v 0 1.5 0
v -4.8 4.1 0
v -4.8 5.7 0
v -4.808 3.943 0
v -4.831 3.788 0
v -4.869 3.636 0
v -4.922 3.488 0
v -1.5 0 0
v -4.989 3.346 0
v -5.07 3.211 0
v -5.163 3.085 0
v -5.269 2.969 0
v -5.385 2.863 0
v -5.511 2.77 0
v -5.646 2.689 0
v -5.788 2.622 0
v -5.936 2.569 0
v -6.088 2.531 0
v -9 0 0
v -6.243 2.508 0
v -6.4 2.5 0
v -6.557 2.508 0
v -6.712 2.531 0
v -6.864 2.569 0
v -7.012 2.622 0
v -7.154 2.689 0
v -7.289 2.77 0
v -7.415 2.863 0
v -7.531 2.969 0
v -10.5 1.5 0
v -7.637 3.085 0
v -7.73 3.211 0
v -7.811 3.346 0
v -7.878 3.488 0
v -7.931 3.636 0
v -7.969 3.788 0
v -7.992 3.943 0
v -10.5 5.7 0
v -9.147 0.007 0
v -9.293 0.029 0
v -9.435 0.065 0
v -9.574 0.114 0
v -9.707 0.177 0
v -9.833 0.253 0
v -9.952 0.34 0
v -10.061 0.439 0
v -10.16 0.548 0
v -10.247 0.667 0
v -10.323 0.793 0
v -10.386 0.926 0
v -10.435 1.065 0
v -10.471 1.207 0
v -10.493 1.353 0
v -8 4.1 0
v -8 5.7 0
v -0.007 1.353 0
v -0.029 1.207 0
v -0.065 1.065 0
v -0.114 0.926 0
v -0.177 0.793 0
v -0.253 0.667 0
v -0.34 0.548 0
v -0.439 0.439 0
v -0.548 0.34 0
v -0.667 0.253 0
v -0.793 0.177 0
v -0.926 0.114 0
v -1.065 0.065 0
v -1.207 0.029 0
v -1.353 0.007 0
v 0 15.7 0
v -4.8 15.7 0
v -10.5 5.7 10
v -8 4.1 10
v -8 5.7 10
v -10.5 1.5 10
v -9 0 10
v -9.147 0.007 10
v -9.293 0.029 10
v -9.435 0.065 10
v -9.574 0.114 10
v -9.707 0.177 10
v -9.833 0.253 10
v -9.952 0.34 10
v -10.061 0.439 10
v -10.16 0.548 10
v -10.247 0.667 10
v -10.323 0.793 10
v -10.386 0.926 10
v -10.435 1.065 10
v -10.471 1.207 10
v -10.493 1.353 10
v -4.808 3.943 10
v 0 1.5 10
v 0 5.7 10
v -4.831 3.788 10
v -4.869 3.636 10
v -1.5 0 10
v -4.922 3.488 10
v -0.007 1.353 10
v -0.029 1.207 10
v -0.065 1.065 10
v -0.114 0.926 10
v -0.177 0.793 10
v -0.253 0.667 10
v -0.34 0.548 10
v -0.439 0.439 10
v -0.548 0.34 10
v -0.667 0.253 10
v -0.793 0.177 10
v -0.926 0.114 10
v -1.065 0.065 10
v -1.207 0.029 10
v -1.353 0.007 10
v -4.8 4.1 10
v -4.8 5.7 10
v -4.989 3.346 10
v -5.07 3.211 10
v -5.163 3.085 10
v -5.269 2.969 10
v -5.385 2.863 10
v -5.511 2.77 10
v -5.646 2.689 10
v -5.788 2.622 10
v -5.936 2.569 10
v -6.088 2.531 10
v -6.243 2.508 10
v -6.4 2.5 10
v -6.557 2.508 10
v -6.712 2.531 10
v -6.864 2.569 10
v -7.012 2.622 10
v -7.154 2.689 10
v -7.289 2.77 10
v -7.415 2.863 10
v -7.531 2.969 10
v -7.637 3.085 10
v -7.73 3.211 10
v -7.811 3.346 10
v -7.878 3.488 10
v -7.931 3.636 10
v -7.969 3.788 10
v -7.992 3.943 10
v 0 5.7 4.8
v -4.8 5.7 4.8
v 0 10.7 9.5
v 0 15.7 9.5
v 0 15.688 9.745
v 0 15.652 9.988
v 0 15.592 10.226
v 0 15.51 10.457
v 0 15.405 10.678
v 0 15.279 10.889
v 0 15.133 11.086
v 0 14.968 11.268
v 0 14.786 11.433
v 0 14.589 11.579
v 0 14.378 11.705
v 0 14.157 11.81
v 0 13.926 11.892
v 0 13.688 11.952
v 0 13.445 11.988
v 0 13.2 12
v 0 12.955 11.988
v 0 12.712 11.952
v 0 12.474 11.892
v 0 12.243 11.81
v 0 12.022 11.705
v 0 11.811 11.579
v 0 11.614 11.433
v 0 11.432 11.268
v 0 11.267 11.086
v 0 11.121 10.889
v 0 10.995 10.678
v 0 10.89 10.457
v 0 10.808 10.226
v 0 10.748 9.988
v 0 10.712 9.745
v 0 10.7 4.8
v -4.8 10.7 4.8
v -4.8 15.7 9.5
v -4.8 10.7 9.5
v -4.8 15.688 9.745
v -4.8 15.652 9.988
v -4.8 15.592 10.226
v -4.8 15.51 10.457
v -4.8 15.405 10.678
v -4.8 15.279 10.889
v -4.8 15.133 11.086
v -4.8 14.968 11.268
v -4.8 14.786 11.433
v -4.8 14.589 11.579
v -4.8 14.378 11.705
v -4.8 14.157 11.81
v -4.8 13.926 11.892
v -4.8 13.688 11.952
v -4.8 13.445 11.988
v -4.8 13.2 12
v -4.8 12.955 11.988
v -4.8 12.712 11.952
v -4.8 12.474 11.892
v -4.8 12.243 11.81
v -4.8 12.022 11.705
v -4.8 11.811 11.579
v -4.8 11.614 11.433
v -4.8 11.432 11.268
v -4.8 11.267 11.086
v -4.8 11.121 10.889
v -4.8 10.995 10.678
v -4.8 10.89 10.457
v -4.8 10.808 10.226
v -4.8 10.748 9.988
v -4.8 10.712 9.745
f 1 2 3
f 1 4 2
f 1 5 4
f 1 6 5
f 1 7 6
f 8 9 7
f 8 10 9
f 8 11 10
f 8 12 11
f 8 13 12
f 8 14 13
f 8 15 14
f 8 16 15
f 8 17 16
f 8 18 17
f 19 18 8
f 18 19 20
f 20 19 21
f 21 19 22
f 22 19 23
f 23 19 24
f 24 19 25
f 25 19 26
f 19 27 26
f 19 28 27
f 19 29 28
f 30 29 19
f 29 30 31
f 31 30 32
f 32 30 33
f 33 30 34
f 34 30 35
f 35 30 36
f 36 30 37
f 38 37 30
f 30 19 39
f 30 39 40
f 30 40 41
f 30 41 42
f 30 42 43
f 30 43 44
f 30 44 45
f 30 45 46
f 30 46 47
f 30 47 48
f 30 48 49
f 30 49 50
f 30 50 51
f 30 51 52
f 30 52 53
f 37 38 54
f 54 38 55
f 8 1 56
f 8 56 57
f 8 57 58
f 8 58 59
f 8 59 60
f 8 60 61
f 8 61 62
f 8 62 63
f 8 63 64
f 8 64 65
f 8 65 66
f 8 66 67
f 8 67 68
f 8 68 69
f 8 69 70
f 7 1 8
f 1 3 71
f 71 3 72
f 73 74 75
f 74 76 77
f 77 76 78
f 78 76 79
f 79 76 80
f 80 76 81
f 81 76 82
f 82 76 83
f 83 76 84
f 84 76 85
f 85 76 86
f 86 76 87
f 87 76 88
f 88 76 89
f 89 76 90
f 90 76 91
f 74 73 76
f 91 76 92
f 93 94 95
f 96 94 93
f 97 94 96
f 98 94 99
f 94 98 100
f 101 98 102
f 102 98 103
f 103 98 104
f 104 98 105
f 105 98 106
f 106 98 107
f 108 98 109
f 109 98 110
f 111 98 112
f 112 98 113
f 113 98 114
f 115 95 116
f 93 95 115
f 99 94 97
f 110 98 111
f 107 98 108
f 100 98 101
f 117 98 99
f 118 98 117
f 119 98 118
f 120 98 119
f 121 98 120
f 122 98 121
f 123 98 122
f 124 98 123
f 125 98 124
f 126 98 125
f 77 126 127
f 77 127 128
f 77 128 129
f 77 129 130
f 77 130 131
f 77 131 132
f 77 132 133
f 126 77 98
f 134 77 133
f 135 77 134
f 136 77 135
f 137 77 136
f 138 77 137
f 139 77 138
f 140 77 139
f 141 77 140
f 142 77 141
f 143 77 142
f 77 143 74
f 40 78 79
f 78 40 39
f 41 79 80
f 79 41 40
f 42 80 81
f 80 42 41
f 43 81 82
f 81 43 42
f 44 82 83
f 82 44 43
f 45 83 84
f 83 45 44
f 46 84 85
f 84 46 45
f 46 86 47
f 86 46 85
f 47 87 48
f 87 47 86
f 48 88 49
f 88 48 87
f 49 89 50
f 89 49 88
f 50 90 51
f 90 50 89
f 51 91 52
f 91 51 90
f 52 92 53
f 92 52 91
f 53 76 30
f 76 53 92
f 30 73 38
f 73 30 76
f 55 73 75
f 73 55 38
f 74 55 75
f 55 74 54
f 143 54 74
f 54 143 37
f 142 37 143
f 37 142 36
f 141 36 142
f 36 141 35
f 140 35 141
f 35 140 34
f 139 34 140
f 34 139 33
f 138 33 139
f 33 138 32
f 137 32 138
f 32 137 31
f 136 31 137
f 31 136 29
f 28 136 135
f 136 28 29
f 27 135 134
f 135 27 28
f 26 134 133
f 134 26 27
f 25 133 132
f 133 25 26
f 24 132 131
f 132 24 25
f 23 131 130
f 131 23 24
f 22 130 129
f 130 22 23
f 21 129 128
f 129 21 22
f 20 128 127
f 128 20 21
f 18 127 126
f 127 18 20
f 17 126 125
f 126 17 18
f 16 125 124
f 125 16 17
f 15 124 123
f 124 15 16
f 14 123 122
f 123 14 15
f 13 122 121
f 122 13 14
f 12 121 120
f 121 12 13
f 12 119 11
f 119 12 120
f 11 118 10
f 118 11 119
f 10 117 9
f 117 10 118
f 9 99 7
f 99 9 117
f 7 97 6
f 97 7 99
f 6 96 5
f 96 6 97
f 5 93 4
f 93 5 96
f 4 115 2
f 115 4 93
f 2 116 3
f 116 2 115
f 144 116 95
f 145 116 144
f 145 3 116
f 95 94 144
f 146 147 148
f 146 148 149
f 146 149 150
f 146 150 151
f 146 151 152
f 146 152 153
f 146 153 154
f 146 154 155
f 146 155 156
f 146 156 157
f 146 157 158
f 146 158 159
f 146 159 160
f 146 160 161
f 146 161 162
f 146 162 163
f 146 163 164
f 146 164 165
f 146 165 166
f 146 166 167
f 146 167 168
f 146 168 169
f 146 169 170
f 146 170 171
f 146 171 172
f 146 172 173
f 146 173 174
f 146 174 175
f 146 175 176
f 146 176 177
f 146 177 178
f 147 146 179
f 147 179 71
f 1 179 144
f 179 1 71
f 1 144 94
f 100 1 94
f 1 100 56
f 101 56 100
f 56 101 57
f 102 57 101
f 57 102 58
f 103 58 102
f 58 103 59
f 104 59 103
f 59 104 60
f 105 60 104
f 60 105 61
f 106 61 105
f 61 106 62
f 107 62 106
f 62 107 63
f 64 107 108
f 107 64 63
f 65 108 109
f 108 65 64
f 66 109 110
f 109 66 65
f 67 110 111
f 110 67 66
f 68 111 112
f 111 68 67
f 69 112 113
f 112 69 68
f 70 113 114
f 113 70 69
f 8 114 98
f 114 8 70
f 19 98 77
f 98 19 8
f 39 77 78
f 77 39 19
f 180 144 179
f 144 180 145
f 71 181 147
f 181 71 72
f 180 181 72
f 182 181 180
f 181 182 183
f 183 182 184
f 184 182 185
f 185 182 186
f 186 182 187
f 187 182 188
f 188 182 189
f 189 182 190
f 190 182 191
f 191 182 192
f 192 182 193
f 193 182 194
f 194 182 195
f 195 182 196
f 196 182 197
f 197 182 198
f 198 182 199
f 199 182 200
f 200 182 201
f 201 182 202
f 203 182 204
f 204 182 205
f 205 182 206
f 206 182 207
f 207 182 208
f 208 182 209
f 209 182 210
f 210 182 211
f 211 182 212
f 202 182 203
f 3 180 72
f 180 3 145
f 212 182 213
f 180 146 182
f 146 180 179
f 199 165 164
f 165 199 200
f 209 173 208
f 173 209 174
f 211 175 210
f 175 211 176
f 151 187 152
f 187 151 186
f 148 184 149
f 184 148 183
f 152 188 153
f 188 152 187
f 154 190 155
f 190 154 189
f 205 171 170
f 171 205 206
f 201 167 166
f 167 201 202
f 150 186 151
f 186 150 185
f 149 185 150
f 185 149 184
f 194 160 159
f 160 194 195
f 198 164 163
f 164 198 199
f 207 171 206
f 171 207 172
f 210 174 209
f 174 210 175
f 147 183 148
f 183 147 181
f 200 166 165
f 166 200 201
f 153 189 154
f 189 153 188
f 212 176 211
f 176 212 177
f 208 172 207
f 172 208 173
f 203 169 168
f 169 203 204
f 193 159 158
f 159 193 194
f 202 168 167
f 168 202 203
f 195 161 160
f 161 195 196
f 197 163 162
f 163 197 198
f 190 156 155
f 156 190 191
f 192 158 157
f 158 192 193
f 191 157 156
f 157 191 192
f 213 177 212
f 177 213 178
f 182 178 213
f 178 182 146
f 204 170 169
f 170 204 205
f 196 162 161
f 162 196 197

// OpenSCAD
$fn = 64;

// Custom
cable_diameter = 3.2;
orientation = "vertical"; // horizontal, vertical
cable_side = "right"; // left, right
board_thickness = 5;

// Hopefully constants
cable_radius = cable_diameter / 2;
board_hook_corner_radius = 2.5;
board_hook_tip_length = 12;
insert_width = 4.8;
corner_radius = 1.5;
clip_height = 10;
hook_tip_width = 2.5;

module corner(side = "left") {
  x_origin = side == "left" ? corner_radius : -corner_radius;

  translate([x_origin, corner_radius, 0])
    circle(r=corner_radius);
}

module cable_hook_cutout() {
  translate([insert_width + cable_radius, hook_tip_width + cable_radius, 0]) {
    circle(r=cable_radius);

    translate([-cable_radius, 0, 0])
      square([cable_radius * 2, cable_radius * 2]);
  }
}

module cable_clip() {
  linear_extrude(clip_height)
    difference() {
      hull() {
        corner(side="left");

        translate([insert_width + (cable_radius * 2) + hook_tip_width, 0, 0])
          corner(side="right");

        translate([0, corner_radius, 0])
          square([insert_width + (cable_radius * 2) + hook_tip_width, cable_radius * 2 + hook_tip_width - corner_radius]);
      }

      cable_hook_cutout();
    }
}

module board_hook_arm() {
  linear_extrude(insert_width)
    translate([0, cable_radius + hook_tip_width, 0])
      square([insert_width, cable_radius + board_thickness + board_hook_corner_radius * 2]);
}

module board_hook_tip() {
  linear_extrude(insert_width)
    translate([0, hook_tip_width + cable_radius * 2 + board_thickness, 0]) {
      hull() {
        square(board_hook_corner_radius * 2);
        translate([board_hook_tip_length - board_hook_corner_radius, board_hook_corner_radius, 0])
          circle(r=board_hook_corner_radius);
      }
    }
}

module vertical_left() {
  cable_clip();
  board_hook_arm();

  mirror([1, 0, 0])
    rotate([0, 270, 0])
      board_hook_tip();
}

module horizontal_left() {
  cable_clip();
  board_hook_arm();
  board_hook_tip();
}

if (orientation == "vertical" && cable_side == "left") {
  vertical_left();
} else if (orientation == "vertical" && cable_side == "right") {
  mirror([1, 0, 0])
    vertical_left();
} else if (orientation == "horizontal" && cable_side == "left") {
  horizontal_left();
} else if (orientation == "horizontal" && cable_side == "right") {
  mirror([1, 0, 0])
    horizontal_left();
}
